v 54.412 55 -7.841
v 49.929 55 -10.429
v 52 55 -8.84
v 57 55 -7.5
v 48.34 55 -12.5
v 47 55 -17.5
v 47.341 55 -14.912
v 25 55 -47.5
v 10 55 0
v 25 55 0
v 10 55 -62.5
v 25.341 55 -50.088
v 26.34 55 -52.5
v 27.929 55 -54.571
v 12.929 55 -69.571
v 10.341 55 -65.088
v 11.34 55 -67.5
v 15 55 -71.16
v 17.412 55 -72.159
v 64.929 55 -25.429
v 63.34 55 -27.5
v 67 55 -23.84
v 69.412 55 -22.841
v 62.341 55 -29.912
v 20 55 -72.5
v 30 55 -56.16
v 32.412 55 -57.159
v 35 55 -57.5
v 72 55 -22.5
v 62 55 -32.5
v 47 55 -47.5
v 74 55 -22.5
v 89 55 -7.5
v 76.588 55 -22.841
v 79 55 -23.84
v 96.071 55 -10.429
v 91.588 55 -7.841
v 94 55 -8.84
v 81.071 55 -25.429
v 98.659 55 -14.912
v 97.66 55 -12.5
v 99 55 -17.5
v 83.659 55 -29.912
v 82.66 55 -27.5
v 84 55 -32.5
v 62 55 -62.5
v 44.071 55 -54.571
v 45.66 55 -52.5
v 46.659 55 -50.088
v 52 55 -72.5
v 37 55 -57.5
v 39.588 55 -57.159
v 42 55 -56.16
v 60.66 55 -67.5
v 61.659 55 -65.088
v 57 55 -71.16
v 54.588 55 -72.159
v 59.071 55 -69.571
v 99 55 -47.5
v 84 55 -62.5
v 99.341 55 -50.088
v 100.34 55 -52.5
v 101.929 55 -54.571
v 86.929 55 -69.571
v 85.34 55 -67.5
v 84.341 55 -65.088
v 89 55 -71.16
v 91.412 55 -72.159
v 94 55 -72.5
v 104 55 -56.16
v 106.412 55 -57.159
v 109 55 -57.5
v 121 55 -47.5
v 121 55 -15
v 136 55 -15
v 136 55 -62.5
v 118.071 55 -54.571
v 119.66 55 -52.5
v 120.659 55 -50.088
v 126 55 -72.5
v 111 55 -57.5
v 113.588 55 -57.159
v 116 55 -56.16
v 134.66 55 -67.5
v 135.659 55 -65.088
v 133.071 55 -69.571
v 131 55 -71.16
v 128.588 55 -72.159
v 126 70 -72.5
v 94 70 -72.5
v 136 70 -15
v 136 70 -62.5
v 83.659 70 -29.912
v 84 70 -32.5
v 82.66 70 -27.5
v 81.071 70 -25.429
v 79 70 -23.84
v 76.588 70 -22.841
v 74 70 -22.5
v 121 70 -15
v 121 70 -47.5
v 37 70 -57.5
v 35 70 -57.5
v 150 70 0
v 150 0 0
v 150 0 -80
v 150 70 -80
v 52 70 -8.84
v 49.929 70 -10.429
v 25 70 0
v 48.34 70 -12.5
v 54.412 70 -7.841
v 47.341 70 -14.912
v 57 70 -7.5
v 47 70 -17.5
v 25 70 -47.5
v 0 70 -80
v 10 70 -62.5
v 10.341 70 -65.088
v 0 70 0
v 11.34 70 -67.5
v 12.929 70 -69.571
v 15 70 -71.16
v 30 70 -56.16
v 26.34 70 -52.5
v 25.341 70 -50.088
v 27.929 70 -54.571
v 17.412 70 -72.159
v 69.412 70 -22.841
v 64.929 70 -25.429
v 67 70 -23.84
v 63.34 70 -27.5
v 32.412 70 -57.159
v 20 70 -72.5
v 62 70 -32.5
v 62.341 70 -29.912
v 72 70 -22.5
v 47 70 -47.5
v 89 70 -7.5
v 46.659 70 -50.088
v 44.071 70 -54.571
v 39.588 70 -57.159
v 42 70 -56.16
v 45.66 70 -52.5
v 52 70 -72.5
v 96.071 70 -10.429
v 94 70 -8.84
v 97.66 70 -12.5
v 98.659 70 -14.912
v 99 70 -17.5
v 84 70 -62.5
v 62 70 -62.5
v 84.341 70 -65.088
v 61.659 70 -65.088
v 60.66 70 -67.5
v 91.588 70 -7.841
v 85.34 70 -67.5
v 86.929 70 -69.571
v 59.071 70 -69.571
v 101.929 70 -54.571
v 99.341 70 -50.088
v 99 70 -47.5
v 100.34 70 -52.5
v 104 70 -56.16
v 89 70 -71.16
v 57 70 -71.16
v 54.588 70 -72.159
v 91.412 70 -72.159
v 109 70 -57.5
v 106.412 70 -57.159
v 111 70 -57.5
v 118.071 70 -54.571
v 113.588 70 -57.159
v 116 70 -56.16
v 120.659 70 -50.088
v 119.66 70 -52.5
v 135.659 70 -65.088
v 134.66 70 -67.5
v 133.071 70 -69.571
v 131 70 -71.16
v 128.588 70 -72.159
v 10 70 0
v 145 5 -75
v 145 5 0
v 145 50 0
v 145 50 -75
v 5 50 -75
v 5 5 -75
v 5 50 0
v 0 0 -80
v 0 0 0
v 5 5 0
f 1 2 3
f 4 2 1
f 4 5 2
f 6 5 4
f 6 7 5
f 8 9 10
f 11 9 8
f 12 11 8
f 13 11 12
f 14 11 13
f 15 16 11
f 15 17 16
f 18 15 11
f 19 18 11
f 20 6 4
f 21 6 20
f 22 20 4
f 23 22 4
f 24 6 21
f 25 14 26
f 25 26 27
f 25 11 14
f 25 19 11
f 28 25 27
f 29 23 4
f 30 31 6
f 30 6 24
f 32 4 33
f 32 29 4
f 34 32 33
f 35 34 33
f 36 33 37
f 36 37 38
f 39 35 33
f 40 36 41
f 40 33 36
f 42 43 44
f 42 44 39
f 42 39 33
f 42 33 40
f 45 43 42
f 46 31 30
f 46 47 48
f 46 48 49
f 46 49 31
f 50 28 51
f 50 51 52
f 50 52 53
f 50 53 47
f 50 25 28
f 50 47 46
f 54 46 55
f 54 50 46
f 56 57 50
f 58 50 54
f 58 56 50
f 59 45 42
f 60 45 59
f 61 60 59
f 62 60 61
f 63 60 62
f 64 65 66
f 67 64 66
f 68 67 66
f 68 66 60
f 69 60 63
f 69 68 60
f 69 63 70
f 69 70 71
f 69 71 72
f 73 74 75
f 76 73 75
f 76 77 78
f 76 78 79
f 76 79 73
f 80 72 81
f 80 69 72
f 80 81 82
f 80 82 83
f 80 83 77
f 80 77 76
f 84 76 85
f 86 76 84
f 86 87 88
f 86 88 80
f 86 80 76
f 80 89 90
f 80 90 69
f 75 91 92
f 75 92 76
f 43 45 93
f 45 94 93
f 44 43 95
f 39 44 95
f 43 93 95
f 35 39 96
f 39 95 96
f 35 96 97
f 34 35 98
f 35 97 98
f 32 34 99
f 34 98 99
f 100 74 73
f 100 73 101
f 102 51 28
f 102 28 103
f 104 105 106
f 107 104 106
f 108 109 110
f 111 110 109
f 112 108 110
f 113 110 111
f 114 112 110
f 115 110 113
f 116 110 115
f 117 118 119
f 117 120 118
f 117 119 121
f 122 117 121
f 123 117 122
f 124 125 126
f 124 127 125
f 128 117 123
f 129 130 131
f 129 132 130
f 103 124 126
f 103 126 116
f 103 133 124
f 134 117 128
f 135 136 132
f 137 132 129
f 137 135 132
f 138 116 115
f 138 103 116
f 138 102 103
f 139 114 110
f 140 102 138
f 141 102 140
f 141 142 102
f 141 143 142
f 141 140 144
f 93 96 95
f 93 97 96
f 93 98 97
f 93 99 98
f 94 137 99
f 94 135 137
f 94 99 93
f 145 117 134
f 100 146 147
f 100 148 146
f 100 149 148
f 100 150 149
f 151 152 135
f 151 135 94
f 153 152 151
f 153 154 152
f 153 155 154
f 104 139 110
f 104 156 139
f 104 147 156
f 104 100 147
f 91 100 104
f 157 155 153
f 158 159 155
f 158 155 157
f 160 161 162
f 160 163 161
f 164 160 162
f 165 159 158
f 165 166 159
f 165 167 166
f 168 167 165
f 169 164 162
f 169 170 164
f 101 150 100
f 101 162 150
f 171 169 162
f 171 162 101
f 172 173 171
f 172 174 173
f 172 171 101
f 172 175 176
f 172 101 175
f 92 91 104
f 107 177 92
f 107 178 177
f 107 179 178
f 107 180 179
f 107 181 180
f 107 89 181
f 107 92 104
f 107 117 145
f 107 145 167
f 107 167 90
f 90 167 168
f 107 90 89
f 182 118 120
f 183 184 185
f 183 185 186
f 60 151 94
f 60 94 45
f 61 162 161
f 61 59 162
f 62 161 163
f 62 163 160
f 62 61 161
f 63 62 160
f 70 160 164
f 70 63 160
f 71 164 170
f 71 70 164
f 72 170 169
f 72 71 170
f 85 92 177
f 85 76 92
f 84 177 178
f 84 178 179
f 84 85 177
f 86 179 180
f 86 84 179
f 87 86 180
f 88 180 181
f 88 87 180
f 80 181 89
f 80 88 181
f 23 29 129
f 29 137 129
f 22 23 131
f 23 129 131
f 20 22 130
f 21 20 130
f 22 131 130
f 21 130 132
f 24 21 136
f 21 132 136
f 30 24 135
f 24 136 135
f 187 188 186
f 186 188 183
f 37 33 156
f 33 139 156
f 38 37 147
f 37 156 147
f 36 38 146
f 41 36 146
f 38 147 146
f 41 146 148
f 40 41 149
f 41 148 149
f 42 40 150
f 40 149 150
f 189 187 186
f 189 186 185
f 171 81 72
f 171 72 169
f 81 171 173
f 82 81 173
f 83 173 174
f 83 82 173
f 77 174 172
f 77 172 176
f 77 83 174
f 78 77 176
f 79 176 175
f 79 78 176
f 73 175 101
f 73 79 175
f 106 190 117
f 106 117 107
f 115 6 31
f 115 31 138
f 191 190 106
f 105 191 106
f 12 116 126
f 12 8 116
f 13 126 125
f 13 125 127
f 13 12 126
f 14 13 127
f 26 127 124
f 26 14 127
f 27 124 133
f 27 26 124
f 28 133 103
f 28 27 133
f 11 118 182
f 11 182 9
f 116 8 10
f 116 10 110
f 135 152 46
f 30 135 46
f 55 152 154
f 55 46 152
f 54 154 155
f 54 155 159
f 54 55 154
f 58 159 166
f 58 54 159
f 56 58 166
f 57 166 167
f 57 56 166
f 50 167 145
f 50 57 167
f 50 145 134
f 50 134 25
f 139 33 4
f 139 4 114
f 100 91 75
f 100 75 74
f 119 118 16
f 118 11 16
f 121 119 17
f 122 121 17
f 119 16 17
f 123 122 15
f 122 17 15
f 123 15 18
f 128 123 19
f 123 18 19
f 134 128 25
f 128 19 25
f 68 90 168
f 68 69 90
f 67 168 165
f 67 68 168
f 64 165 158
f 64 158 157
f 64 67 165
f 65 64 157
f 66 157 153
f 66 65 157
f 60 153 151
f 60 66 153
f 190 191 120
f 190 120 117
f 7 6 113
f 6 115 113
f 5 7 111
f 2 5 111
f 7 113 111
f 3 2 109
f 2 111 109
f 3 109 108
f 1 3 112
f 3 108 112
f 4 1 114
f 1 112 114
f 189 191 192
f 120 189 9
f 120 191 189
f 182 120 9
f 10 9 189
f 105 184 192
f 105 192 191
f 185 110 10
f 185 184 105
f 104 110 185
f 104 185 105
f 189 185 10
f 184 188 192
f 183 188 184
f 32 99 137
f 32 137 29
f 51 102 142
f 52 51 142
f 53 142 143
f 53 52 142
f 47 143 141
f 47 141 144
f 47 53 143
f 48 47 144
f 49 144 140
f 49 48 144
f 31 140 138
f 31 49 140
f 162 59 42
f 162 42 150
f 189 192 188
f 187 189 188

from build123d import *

# Parameters (mm, degrees)
SKETCH1_W                 = 150
SKETCH1_H                 = 80
BOSS_EXTRUDE1_DEPTH       = 70
SHELL1_T                  = -5
SHELL1_THICKNESS_2_FACE_W = 75
SHELL1_THICKNESS_2_FACE_H = 140
SHELL1_THICKNESS_2_DEPTH  = 15
SKETCH2_W                 = 15
SKETCH2_H                 = 15
FILLET1_R                 = 10


with BuildPart() as part:
    # Sketch1 → Boss-Extrude1 (new body)
    with BuildSketch(Plane(origin=(0, 0, 0), x_dir=(1, 0, 0), z_dir=(0, 1, 0))):
        with Locations((75, 40)):
            Rectangle(SKETCH1_W, SKETCH1_H)
    extrude(amount=BOSS_EXTRUDE1_DEPTH)

    # Shell1
    shell1_openings = [part.faces().sort_by_distance(p)[0] for p in [
        (75, 35, 0),
    ]]
    offset(amount=SHELL1_T, openings=shell1_openings, kind=Kind.INTERSECTION)

    # Shell1 thickness 2 face (on inner face of the shell) → Shell1 thickness 2 (add)
    with BuildSketch(Plane(origin=(75, 65, -37.5), x_dir=(0, 0, 1), z_dir=(0, 1, 0))):
        Rectangle(SHELL1_THICKNESS_2_FACE_W, SHELL1_THICKNESS_2_FACE_H)
    extrude(amount=-SHELL1_THICKNESS_2_DEPTH)

    # Cut-Sweep1: sweep along a path in Sketch3
    with BuildLine(Plane(origin=(0, 70, 0), x_dir=(1, 0, 0), z_dir=(0, 1, 0))) as cut_sweep1_path:
        Line((17.5, 0), (17.5, 65))
        Line((17.5, 65), (54.5, 65))
        Line((54.5, 65), (54.5, 15))
        Line((54.5, 15), (91.5, 15))
        Line((91.5, 15), (91.5, 65))
        Line((91.5, 65), (128.5, 65))
        Line((128.5, 65), (128.5, 15))
    # Sketch2 → Cut-Sweep1 (sweep, cut)
    with BuildSketch(Plane.XY):
        with Locations((17.5, 62.5)):
            Rectangle(SKETCH2_W, SKETCH2_H)
    sweep(path=cut_sweep1_path.line, transition=Transition.RIGHT, mode=Mode.SUBTRACT)

    # Fillet1
    fillet1_edges = [part.edges().sort_by_distance(p)[0] for p in [
        (121, 62.5, -57.5),
        (136, 62.5, -72.5),
        (84, 62.5, -72.5),
        (99, 62.5, -57.5),
        (84, 62.5, -22.5),
        (99, 62.5, -7.5),
        (62, 62.5, -22.5),
        (47, 62.5, -7.5),
        (62, 62.5, -72.5),
        (47, 62.5, -57.5),
        (10, 62.5, -72.5),
        (25, 62.5, -57.5),
    ]]
    fillet(fillet1_edges, radius=FILLET1_R)


solid = part.part
